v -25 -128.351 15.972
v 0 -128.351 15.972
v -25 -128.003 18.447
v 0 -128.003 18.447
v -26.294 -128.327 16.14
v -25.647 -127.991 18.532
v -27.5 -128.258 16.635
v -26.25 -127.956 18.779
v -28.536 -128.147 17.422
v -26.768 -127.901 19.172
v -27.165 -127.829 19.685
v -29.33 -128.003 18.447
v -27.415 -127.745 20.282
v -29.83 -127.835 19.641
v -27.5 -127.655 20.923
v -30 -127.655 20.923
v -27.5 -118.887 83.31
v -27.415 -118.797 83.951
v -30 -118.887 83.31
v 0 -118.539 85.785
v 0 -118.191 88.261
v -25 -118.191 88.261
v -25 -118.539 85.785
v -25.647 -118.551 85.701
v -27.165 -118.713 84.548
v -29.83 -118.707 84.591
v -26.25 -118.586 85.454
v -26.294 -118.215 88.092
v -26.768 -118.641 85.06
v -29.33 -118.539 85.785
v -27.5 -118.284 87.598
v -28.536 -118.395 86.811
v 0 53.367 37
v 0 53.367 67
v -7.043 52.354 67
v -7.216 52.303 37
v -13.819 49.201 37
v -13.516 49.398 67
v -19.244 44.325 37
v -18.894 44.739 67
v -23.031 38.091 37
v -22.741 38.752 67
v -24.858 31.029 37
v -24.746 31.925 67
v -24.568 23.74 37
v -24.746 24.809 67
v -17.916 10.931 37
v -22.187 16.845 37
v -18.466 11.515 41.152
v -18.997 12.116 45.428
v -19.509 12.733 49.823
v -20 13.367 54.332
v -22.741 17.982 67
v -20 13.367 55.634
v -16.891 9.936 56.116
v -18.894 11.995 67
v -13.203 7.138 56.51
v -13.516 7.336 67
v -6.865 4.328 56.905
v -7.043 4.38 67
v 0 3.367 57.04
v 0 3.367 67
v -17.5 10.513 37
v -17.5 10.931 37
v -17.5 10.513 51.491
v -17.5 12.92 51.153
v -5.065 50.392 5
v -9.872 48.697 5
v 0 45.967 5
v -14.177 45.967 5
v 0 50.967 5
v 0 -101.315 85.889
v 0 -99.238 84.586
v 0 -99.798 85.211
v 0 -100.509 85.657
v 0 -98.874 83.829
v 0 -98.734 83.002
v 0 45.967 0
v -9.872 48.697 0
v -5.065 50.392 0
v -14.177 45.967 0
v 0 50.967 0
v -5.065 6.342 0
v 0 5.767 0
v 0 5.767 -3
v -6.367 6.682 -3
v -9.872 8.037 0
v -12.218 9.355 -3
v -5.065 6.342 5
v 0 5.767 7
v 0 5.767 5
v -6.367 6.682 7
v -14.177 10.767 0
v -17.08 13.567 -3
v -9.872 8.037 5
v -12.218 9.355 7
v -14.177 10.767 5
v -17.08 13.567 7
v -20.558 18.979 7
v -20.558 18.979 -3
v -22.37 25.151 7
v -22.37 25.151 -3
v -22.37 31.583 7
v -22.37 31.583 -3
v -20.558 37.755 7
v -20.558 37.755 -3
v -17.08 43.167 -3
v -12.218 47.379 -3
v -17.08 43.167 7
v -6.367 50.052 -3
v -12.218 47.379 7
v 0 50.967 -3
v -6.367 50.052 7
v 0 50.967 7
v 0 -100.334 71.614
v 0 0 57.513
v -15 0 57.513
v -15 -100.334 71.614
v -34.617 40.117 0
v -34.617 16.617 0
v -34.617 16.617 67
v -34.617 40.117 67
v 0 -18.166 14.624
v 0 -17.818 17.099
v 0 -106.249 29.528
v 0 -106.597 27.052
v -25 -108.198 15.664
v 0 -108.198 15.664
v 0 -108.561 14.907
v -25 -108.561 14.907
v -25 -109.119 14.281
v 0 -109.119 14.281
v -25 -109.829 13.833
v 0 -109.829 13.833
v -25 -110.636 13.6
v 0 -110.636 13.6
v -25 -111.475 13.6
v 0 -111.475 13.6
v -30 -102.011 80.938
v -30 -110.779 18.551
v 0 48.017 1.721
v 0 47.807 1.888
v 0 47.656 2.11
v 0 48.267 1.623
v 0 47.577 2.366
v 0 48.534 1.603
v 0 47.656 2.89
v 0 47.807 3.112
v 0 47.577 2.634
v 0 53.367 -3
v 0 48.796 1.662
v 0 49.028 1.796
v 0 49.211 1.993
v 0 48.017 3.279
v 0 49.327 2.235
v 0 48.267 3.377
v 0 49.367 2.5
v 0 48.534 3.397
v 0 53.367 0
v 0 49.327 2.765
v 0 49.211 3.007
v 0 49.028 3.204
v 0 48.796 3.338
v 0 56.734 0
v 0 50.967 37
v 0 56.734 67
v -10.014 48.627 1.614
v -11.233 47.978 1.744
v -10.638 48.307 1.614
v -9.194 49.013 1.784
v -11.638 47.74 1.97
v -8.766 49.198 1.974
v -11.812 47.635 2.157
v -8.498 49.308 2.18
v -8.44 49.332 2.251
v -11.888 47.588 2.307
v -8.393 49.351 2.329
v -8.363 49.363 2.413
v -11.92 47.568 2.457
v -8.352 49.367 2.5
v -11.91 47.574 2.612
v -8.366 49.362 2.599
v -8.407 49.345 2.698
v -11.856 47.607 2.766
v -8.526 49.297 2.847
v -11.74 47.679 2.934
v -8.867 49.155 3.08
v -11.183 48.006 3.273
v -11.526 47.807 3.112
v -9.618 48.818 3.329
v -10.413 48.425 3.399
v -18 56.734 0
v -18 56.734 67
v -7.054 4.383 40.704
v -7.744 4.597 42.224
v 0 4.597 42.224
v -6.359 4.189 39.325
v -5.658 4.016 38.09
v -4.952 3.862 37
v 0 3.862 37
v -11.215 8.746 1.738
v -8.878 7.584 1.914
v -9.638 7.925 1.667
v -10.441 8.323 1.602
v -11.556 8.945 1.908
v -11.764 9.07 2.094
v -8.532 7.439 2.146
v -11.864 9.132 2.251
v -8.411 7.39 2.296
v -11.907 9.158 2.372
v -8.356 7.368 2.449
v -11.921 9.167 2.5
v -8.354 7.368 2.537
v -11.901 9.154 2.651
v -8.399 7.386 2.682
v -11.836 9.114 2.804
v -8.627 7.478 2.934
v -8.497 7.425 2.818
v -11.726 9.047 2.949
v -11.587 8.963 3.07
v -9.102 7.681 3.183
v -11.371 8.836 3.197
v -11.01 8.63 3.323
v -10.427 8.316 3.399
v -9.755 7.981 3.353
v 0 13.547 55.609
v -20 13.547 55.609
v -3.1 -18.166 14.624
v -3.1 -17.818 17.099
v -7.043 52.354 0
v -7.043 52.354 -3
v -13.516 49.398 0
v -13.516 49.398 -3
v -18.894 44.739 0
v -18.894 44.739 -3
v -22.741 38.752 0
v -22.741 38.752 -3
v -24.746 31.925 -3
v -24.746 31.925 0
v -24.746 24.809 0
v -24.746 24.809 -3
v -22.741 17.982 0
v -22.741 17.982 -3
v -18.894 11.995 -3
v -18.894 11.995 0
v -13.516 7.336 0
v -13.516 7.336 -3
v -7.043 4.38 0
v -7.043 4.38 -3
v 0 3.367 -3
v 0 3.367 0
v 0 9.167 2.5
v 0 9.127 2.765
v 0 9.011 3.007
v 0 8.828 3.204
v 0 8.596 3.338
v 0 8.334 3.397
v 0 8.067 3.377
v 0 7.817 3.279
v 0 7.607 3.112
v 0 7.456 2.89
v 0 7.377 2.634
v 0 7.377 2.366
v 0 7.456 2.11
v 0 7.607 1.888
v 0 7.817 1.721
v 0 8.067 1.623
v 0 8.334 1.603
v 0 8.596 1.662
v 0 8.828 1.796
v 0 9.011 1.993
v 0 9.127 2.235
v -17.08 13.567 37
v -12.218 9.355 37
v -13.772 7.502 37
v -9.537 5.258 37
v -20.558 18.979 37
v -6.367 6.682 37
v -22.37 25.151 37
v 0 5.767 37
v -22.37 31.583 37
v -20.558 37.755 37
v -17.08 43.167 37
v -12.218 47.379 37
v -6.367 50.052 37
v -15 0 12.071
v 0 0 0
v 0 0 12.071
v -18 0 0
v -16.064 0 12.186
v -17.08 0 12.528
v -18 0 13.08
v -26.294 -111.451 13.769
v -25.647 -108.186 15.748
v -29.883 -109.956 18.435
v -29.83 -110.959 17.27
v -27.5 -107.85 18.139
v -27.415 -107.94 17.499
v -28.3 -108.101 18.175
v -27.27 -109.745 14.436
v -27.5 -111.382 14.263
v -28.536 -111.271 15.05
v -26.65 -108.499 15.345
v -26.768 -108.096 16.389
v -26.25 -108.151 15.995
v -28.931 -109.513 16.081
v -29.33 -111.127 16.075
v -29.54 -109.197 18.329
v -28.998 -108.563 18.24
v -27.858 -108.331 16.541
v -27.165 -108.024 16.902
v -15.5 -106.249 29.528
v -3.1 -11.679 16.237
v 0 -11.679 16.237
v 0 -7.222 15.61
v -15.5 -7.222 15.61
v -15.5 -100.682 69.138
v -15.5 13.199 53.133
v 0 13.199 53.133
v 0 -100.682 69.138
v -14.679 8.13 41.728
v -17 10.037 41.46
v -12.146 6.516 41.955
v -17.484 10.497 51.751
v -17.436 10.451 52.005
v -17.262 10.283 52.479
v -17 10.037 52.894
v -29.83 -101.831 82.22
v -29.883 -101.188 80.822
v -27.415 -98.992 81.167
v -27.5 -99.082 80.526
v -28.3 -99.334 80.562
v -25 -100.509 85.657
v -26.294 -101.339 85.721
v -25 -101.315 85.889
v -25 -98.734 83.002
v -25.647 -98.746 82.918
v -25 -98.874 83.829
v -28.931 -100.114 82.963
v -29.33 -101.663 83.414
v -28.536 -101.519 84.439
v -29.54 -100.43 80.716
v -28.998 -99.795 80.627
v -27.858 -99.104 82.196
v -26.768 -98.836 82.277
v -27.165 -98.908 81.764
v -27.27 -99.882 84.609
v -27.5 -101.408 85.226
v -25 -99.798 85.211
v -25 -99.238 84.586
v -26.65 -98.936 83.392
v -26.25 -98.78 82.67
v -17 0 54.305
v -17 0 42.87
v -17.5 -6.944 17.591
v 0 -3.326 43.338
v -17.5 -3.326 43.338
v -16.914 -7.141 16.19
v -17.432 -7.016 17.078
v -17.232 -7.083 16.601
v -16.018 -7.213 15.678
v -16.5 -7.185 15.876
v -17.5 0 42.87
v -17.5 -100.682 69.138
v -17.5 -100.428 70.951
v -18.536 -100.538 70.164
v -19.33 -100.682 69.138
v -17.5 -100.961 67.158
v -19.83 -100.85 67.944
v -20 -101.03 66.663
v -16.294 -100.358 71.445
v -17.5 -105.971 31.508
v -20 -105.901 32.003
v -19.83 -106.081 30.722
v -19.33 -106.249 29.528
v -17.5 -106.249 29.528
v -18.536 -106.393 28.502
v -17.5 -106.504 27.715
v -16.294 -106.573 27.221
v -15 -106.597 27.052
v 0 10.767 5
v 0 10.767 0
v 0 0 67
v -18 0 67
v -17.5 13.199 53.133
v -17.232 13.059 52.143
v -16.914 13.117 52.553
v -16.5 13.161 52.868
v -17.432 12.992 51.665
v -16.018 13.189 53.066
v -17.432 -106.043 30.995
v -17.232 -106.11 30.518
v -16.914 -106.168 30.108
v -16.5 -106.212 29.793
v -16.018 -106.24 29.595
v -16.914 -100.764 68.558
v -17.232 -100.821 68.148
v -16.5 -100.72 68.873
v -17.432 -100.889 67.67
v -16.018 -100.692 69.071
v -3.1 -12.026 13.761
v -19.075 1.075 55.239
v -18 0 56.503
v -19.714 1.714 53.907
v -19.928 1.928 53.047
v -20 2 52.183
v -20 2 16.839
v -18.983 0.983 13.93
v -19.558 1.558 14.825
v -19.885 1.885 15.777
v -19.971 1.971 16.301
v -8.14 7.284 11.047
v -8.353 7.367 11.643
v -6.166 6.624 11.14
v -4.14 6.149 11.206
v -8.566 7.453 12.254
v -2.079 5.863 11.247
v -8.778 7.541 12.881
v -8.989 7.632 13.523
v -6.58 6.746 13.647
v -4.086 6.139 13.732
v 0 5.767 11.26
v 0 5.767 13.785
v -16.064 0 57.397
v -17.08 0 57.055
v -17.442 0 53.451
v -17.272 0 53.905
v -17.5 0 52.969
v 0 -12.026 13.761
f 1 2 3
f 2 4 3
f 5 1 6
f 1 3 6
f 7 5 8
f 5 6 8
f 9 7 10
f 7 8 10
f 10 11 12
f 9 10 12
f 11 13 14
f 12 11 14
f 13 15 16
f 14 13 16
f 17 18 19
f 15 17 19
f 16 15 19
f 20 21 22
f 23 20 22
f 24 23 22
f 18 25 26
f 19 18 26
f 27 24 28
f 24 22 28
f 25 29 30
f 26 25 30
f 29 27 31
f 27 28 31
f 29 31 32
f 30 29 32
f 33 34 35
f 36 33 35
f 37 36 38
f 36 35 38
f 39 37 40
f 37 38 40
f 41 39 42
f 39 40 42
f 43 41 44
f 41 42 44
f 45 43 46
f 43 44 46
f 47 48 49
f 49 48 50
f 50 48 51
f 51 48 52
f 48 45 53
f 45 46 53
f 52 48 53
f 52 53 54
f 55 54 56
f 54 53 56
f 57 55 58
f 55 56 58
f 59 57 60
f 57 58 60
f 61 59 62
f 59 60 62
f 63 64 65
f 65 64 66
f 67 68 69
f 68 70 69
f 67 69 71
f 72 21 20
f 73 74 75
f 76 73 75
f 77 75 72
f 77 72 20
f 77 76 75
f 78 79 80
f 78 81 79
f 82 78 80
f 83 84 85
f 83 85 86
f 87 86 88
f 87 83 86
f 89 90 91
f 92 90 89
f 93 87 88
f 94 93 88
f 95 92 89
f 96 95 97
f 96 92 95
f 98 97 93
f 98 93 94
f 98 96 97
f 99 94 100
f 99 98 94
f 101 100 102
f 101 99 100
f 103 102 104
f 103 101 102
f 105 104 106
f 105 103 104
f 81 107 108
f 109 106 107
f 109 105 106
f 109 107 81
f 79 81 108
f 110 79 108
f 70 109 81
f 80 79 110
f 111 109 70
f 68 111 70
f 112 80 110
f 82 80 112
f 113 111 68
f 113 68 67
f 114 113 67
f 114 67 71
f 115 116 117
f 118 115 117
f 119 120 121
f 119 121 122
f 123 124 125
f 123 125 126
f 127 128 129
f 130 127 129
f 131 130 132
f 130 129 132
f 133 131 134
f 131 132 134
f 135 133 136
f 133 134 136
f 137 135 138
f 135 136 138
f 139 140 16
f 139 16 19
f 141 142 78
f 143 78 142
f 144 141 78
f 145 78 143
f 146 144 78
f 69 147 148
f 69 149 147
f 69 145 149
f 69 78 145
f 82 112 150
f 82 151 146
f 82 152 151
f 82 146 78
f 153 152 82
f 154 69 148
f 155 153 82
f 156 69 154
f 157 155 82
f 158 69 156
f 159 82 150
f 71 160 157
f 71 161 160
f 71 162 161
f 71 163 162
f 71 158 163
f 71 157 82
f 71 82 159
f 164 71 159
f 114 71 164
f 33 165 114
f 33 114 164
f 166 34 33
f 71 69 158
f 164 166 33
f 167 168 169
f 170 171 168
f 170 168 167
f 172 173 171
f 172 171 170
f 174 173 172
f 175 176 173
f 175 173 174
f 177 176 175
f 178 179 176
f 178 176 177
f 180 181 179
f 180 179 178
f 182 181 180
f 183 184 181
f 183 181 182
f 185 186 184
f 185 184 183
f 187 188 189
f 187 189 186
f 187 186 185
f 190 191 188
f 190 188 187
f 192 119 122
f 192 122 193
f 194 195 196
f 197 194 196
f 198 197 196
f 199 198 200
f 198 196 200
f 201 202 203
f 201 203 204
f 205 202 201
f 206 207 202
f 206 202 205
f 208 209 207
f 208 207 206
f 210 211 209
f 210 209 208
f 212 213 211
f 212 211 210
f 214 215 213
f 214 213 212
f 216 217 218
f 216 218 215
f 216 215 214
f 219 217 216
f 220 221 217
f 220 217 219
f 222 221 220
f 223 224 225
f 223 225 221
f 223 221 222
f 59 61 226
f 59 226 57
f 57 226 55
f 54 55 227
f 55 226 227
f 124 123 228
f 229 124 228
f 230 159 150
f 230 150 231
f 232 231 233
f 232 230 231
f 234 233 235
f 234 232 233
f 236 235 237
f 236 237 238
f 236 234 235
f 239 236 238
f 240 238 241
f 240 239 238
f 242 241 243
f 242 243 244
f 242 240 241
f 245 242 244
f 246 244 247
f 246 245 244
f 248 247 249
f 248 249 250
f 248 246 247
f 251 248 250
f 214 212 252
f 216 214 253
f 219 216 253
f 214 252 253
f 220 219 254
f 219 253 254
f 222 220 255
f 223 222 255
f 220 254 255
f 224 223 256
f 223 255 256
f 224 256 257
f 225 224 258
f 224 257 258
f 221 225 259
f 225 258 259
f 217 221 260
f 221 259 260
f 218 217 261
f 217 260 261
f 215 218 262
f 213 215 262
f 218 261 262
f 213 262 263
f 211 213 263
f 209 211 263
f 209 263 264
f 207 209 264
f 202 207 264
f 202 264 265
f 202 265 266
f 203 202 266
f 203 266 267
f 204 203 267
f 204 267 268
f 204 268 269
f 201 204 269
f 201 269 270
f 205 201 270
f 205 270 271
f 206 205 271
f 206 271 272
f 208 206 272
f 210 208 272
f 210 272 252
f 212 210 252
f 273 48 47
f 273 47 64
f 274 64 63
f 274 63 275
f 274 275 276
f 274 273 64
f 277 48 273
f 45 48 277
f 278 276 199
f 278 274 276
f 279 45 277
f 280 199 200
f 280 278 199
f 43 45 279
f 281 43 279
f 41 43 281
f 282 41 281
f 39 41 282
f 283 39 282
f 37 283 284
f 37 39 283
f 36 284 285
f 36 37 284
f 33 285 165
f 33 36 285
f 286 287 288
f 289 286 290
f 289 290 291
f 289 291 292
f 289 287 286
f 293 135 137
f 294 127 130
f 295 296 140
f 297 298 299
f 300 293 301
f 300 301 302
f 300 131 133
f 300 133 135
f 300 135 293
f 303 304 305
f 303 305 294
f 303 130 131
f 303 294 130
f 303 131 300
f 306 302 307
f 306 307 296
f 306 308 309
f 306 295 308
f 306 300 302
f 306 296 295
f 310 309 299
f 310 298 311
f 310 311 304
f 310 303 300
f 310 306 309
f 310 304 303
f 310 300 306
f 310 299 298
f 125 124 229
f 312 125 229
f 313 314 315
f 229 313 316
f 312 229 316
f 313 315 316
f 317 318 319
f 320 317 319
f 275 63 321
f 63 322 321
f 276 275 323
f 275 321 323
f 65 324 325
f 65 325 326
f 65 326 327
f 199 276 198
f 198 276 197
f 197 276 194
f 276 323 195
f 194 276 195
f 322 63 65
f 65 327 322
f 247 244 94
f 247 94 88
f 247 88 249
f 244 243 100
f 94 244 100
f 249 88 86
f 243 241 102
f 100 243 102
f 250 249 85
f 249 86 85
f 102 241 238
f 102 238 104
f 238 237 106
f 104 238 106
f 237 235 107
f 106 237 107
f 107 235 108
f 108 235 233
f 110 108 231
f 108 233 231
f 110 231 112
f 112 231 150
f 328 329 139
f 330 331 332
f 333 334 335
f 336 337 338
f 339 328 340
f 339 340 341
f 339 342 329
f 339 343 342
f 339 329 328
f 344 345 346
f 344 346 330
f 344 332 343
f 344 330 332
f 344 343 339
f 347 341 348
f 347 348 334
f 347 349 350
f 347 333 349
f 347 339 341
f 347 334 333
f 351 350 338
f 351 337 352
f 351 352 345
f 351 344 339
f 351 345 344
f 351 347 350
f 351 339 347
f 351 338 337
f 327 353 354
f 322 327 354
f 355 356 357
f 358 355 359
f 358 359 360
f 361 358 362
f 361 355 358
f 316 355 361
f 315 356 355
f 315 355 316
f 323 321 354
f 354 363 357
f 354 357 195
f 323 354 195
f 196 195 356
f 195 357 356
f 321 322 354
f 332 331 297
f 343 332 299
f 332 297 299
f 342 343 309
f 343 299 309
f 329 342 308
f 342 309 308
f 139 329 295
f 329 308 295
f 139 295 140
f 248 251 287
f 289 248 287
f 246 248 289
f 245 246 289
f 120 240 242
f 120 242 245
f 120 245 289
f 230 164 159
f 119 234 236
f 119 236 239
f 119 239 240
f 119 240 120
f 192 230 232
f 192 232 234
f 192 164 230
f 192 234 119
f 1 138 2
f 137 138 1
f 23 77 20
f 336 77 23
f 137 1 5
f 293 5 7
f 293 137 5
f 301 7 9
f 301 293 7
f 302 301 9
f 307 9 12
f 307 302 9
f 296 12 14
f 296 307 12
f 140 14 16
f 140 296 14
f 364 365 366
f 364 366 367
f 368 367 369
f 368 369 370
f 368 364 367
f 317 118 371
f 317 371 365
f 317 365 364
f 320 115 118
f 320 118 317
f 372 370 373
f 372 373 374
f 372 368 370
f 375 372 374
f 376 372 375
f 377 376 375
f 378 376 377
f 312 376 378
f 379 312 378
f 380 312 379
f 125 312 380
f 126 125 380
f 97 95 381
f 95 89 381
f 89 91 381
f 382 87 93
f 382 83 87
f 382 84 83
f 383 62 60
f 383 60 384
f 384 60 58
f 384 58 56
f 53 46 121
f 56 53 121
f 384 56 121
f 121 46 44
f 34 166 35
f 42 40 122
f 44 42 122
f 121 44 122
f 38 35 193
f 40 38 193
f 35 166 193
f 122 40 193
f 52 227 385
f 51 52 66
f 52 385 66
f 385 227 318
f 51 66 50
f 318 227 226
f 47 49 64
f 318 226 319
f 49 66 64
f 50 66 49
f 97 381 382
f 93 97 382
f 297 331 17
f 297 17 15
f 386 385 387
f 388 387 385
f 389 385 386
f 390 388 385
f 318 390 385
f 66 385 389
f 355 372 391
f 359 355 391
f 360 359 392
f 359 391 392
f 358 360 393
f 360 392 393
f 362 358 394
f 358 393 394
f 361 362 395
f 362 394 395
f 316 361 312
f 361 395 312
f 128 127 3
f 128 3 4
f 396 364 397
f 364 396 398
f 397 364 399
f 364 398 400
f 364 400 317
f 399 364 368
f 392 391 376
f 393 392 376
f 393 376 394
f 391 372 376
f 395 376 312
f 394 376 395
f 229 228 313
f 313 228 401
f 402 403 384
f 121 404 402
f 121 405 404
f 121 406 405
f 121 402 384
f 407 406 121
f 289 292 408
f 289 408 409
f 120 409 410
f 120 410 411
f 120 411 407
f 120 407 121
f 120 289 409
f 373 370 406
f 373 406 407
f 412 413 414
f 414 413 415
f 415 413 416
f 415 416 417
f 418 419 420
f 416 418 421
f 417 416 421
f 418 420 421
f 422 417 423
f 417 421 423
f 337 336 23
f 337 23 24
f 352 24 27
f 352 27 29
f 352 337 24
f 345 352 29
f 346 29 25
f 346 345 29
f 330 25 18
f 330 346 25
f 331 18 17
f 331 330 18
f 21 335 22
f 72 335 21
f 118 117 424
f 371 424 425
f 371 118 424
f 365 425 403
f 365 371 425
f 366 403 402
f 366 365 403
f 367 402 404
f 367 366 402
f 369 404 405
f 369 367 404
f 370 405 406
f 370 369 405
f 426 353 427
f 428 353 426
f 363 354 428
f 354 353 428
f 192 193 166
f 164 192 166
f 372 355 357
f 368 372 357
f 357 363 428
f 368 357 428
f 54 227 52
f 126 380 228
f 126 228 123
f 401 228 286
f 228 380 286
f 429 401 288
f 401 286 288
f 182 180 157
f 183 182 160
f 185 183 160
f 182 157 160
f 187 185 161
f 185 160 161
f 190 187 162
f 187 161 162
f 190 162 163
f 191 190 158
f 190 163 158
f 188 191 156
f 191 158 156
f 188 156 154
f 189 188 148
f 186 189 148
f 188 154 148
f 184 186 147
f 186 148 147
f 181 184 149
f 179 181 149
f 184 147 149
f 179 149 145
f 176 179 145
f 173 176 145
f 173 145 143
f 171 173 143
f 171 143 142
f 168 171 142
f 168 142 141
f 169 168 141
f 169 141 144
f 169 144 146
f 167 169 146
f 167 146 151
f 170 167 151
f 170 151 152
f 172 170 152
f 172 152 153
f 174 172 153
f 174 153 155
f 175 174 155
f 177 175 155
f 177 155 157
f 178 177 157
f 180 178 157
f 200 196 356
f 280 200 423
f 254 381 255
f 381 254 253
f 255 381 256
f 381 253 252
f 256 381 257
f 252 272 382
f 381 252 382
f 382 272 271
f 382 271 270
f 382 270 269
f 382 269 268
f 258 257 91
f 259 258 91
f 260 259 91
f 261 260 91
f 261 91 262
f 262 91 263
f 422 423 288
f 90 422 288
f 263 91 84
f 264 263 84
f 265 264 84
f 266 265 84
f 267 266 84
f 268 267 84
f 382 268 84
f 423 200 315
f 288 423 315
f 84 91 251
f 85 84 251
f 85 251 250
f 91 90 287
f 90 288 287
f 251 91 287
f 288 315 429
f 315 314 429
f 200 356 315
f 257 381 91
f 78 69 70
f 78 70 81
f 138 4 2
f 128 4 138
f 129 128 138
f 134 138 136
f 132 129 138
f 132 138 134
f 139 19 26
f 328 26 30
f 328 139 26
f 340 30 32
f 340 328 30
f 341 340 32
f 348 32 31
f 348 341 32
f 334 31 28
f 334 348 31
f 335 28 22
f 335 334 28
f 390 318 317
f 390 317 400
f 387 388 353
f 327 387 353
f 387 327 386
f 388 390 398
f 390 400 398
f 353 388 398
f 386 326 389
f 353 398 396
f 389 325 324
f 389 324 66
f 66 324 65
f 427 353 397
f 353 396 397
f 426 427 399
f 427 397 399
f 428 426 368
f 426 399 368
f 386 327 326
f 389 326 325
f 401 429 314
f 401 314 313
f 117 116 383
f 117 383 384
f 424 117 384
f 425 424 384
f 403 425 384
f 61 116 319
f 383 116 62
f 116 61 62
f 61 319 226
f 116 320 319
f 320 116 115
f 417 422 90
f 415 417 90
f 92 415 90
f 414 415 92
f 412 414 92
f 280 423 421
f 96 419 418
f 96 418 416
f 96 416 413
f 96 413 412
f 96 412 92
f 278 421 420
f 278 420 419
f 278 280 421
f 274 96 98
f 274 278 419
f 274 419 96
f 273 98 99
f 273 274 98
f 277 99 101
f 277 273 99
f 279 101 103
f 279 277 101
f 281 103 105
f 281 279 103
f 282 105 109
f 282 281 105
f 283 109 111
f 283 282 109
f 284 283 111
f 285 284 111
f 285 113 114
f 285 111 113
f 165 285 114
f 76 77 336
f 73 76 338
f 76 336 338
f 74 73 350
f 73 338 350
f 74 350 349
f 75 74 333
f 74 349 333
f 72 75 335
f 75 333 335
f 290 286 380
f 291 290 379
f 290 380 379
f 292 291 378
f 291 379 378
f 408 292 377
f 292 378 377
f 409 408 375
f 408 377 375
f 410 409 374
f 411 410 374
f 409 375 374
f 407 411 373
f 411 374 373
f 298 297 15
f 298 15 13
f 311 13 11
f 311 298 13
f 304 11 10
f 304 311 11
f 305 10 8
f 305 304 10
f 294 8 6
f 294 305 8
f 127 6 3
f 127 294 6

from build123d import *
from build123d.topology import SkipClean

# Parameters (mm, degrees)
Y_KSEKLIK_EKSTR_ZYON1_DEPTH      = 67
IZIM2_R                          = 25
KES_EKSTR_ZYON1_DEPTH            = 70
Y_KSEKLIK_EKSTR_ZYON2_DEPTH      = 40
Y_KSEKLIK_EKSTR_ZYON7_DEPTH      = 100
Y_KSEKLIK_EKSTR_ZYON7_DEPTH_BACK = 15
IZIM15_W                         = 5
IZIM15_H                         = 5
IZIM15_R                         = 0.9
Y_KSEKLIK_EKSTR_ZYON8_DEPTH      = 16
IZIM11_R                         = 22.5
KES_EKSTR_ZYON17_DEPTH           = 33
IZIM24_W                         = 12
IZIM24_H                         = 17
KES_EKSTR_ZYON18_DEPTH           = 20
IZIM29_W                         = 28
IZIM29_H                         = 17.5
Y_KSEKLIK_EKSTR_ZYON12_DEPTH     = 8
IZIM34_W                         = 3.1
IZIM34_H                         = 6.2
KES_EKSTR_ZYON20_DEPTH           = 3
IZIM44_R                         = 22.6
KES_EKSTR_ZYON25_DEPTH           = 30
RADYUS4_R                        = 5
RADYUS5_START                    = -109.324597764
RADYUS5_DEPTH                    = 115
Y_KSEKLIK_EKSTR_ZYON16_DEPTH     = 20
RADYUS7_R                        = 3


with BuildPart() as part:
    # Çizim1 → Yükseklik-Ekstrüzyon1 (new body)
    with BuildSketch(Plane.XY):
        Polygon((0, 0), (-18, 0), (-34.617009358, 16.617009358), (-34.617009358, 40.117009358), (-18, 56.734018716), (0, 56.734018716), align=None)
    extrude(amount=Y_KSEKLIK_EKSTR_ZYON1_DEPTH)

    # Çizim2 → Kes-Ekstrüzyon1 (cut)
    with BuildSketch(Plane.XY.offset(67)):
        with Locations((0, 28.367009358)):
            Circle(IZIM2_R)
    extrude(amount=-KES_EKSTR_ZYON1_DEPTH, mode=Mode.SUBTRACT)

    # Çizim5 → Yükseklik-Ekstrüzyon2 (add)
    with BuildSketch(Plane.XY.offset(37)):
        with BuildLine():
            Line((0, 50.967009358), (0, 53.367009358))
            ThreePointArc((0, 53.367009358), (-25, 28.367009358), (0, 3.367009358))
            Line((0, 3.367009358), (0, 5.767009358))
            ThreePointArc((0, 5.767009358), (-22.6, 28.367009358), (0, 50.967009358))
        make_face()
    extrude(amount=-Y_KSEKLIK_EKSTR_ZYON2_DEPTH)

    # Çizim15 → Yükseklik-Ekstrüzyon8 (add)
    # profile 1 of 2: a face of its own
    with BuildSketch(Plane(origin=(0, 0, 0), x_dir=(0, 0, -1), z_dir=(1, 0, 0))):
        with Locations((-2.5, 8.267009358)):
            Rectangle(IZIM15_W, IZIM15_H)
        with Locations(Location((-2.5, 8.267009358, 0), (0, 0, 90))):
            Circle(IZIM15_R, mode=Mode.SUBTRACT)
    # profile 2 of 2: a face of its own
    with BuildSketch(Plane(origin=(0, 0, 0), x_dir=(0, 0, -1), z_dir=(1, 0, 0))):
        with Locations((-2.5, 48.467009358)):
            Rectangle(IZIM15_W, IZIM15_H)
        with Locations(Location((-2.5, 48.467009358, 0), (0, 0, 90))):
            Circle(IZIM15_R, mode=Mode.SUBTRACT)
    extrude(amount=-Y_KSEKLIK_EKSTR_ZYON8_DEPTH)

    # Çizim24 → Kes-Ekstrüzyon18 (cut)
    with BuildSketch(Plane(origin=(0, -9.23385142, 1.297733186), x_dir=(0, -0.13917310096006572, -0.9902680687415703), z_dir=(0, -0.9902680687415703, 0.13917310096006572))):
        with Locations((-48.453157304, -8.5)):
            Rectangle(IZIM24_W, IZIM24_H)
    extrude(amount=-KES_EKSTR_ZYON18_DEPTH, mode=Mode.SUBTRACT)



with BuildPart() as body_2:
    # Çizim21 → Yükseklik-Ekstrüzyon7 (new, two sides: drawn at the far end of the back side and taken through both)
    with BuildSketch(Plane(origin=(0, -9.23385142, 1.297733186), x_dir=(0, -0.13917310096006572, -0.9902680687415703), z_dir=(0, -0.9902680687415703, 0.13917310096006572)).offset(-Y_KSEKLIK_EKSTR_ZYON7_DEPTH_BACK)):
        Polygon((-56.953157304, 0), (-56.953157304, -20), (-11.953157304, -20), (-11.953157304, 0), (-14.453157304, 0), (-14.453157304, -17.5), (-54.453157304, -17.5), (-54.453157304, 0), align=None)
    extrude(amount=Y_KSEKLIK_EKSTR_ZYON7_DEPTH + Y_KSEKLIK_EKSTR_ZYON7_DEPTH_BACK)

    # Çizim11 → Kes-Ekstrüzyon17 (cut)
    with BuildSketch(Plane.XY.offset(37)):
        with Locations((0, 28.367009358)):
            Circle(IZIM11_R)
    extrude(amount=-KES_EKSTR_ZYON17_DEPTH, mode=Mode.SUBTRACT)


with BuildPart() as part_1:
    add(part.part)

    add(body_2.part)  # Yükseklik-Ekstrüzyon12 merges body 2
    # Çizim29 → Yükseklik-Ekstrüzyon12 (add)
    with BuildSketch(Plane(origin=(0, -9.23385142, 1.297733186), x_dir=(0, -0.13917310096006572, -0.9902680687415703), z_dir=(0, -0.9902680687415703, 0.13917310096006572))):
        with Locations((-28.453157304, -8.75)):
            Rectangle(IZIM29_W, IZIM29_H)
    extrude(amount=-Y_KSEKLIK_EKSTR_ZYON12_DEPTH)

    # Çizim34 → Kes-Ekstrüzyon20 (cut)
    with BuildSketch(Plane(origin=(0, 1.663557968, 11.836829998), x_dir=(-1, 0, 0), z_dir=(0, -0.13917310096006574, -0.9902680687415703))):
        with Locations((1.55, -16.924597764)):
            Rectangle(IZIM34_W, IZIM34_H)
    extrude(amount=-KES_EKSTR_ZYON20_DEPTH, mode=Mode.SUBTRACT)

    # Çizim44 → Kes-Ekstrüzyon25 (cut)
    with SkipClean():  # the faces are left unmerged after this step: merging them gives an invalid solid
        with BuildSketch(Plane.XY.offset(37)):
            with Locations((0, 28.367009358)):
                Circle(IZIM44_R)
        extrude(amount=-KES_EKSTR_ZYON25_DEPTH, mode=Mode.SUBTRACT)

    # Radyus4
    radyus4_edges = [part_1.edges().sort_by_distance(p)[0] for p in [
        (-20, -52.298550163, 19.420709718),
        (-20, -49.167155391, 64.422861646),
    ]]
    fillet(radyus4_edges, radius=RADYUS4_R)

    # Radyus5: read off the stored shape, not the designer's step
    # Radyus5 outline → Radyus5 (add)
    with SkipClean():  # the faces are left unmerged after this step: merging them gives an invalid solid
        with BuildSketch(Plane(origin=(0, 0, 0), x_dir=(1, 0, 0), z_dir=(0, 0.9902680687415703, -0.13917310096006602)).offset(RADYUS5_START)):
            with BuildLine():
                Line((-17.5, -52.453157304), (-17.5, -54.453157304))
                Line((-17.5, -54.453157304), (-15.5, -54.453157304))
                ThreePointArc((-15.5, -54.453157304), (-16.914213562, -53.867370866), (-17.5, -52.453157304))
            make_face()
            with BuildLine():
                Line((-17.5, -14.453157304), (-17.5, -16.453157304))
                ThreePointArc((-17.5, -16.453157304), (-16.914213562, -15.038943742), (-15.5, -14.453157304))
                Line((-15.5, -14.453157304), (-17.5, -14.453157304))
            make_face()
        extrude(amount=RADYUS5_DEPTH)


with BuildPart() as body_2_2:
    # Çizim45 → Yükseklik-Ekstrüzyon16 (new body)
    with BuildSketch(Plane(origin=(0, -108.260658294, 15.215043282), x_dir=(1, 0, 0), z_dir=(0, -0.9902680687415703, 0.13917310096006602))):
        with BuildLine():
            Line((0, -2.046842696), (-25, -2.046842696))
            ThreePointArc((-25, -2.046842696), (-28.535533906, -0.582376602), (-30, 2.953157304))
            Line((-30, 2.953157304), (-30, 65.953157304))
            ThreePointArc((-30, 65.953157304), (-28.535533906, 69.48869121), (-25, 70.953157304))
            Line((-25, 70.953157304), (0, 70.953157304))
            Line((0, 70.953157304), (0, 68.453157304))
            Line((0, 68.453157304), (-25, 68.453157304))
            ThreePointArc((-25, 68.453157304), (-26.767766953, 67.720924257), (-27.5, 65.953157304))
            Line((-27.5, 65.953157304), (-27.5, 2.953157304))
            ThreePointArc((-27.5, 2.953157304), (-26.767766953, 1.185390351), (-25, 0.453157304))
            Line((-25, 0.453157304), (0, 0.453157304))
            Line((0, 0.453157304), (0, -2.046842696))
        make_face()
    extrude(amount=Y_KSEKLIK_EKSTR_ZYON16_DEPTH)

    # Radyus7
    # the kernel refuses this fillet: 3 mm, written as the material it takes off along each edge
    with BuildSketch(Plane(origin=(7.395099729, -108.545523739, 13.188120318), x_dir=(0, -0.9902680687415703, 0.13917310096006616), z_dir=(-1, 0, 0)), Plane(origin=(-25, -98.385887369, 85.477689336), x_dir=(0, -0.9902680687415703, 0.13917310096006602), z_dir=(1, 0, 0))) as radyus7_piece_1:
        with BuildLine():
            CenterArc((2.958039892, 3), RADYUS7_R, 189.594068227, 80.405931773)
            Line((0, 2.5), (-0.059160798, 2.49))
            ThreePointArc((-0.059160798, 2.49), (-0.06, 1.25), (-0.06, 0))
            Line((-0.06, 0), (0, -0.06))
            Line((0, -0.06), (2.958039892, -0.06))
            Line((2.958039892, -0.06), (2.958039892, 0))
        make_face()
    extrude(amount=32.395099729, mode=Mode.SUBTRACT)
    with BuildSketch(Plane(origin=(-25, -99.081752874, 80.526348993), x_dir=(-1, 0, 0), z_dir=(2.814511130798017e-15, -0.13917310096006602, -0.9902680687415703))) as radyus7_piece_2:
        with BuildLine():
            CenterArc((2, -2.958039892), RADYUS7_R, 360, 80.405931773)
            Line((2.5, 0), (2.51, 0.059160798))
            ThreePointArc((2.51, 0.059160798), (3.75, 0.06), (5, 0.06))
            Line((5, 0.06), (5.06, 0))
            Line((5.06, 0), (5.06, -2.958039892))
            Line((5.06, -2.958039892), (5, -2.958039892))
        make_face()
    revolve(axis=Axis((-25, -99.081752874, 80.526348993), (0, 0.9902680687415703, -0.13917310096006602)), revolution_arc=90, mode=Mode.SUBTRACT)
    with BuildSketch(Plane(origin=(-30, -107.849658234, 18.139460662), x_dir=(0, -0.9902680687415701, 0.13917310096006602), z_dir=(0, 0.13917310096006602, 0.9902680687415703))) as radyus7_piece_3:
        with BuildLine():
            CenterArc((2.958039892, 3), RADYUS7_R, 189.594068227, 80.405931773)
            Line((0, 2.5), (-0.059160798, 2.49))
            ThreePointArc((-0.059160798, 2.49), (-0.06, 1.25), (-0.06, 0))
            Line((-0.06, 0), (0, -0.06))
            Line((0, -0.06), (2.958039892, -0.06))
            Line((2.958039892, -0.06), (2.958039892, 0))
        make_face()
    extrude(amount=63, mode=Mode.SUBTRACT)
    with BuildSketch(Plane(origin=(-25, -107.849658234, 18.139460662), x_dir=(0, -0.13917310096006474, -0.9902680687415704), z_dir=(1, 0, 0))) as radyus7_piece_4:
        with BuildLine():
            CenterArc((2, -2.958039892), RADYUS7_R, 0, 80.405931773)
            Line((2.5, 0), (2.51, 0.059160798))
            ThreePointArc((2.51, 0.059160798), (3.75, 0.06), (5, 0.06))
            Line((5, 0.06), (5.06, 0))
            Line((5.06, 0), (5.06, -2.958039892))
            Line((5.06, -2.958039892), (5, -2.958039892))
        make_face()
    revolve(axis=Axis((-25, -107.849658234, 18.139460662), (0, 0.9902680687415703, -0.13917310096006602)), revolution_arc=90, mode=Mode.SUBTRACT)


solid = Compound([part_1.part, body_2_2.part])
